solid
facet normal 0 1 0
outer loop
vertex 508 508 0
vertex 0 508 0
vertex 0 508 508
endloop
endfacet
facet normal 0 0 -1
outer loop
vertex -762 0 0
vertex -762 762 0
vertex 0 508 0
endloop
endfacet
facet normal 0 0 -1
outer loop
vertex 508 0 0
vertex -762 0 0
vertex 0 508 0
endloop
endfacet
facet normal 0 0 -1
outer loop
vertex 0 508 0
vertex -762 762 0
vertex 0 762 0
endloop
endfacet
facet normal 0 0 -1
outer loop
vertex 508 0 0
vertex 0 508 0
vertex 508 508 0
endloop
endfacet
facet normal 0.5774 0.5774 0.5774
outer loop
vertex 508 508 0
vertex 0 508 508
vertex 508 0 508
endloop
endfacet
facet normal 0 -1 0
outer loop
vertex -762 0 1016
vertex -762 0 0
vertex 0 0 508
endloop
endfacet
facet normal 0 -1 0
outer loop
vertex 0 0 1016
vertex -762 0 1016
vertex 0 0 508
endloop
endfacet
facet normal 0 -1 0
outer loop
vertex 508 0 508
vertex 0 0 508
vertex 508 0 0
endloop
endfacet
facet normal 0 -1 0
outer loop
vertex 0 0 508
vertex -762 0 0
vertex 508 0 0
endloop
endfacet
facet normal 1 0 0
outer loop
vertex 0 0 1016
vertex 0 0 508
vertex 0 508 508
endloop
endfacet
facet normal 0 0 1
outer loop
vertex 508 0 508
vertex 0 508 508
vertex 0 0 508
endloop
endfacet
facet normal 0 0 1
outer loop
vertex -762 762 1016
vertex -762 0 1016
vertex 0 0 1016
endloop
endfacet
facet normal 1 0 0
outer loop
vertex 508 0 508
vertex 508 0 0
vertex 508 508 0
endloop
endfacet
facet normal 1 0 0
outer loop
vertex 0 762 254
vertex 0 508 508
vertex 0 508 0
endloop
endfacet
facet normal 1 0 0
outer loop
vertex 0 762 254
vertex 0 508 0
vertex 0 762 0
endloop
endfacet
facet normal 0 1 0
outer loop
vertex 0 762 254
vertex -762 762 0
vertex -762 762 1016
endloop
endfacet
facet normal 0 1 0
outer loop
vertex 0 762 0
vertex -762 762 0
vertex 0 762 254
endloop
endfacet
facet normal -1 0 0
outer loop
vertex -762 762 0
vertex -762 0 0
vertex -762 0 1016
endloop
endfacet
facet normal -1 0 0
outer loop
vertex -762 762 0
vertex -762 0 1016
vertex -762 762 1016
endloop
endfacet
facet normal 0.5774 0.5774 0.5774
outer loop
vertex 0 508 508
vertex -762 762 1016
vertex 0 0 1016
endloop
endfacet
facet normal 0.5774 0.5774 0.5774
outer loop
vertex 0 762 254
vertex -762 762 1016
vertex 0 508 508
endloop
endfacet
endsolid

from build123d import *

# Parameters (mm, degrees)
SKETCH1_W           = 762
SKETCH1_H           = 762
BOSS_EXTRUDE2_DEPTH = 1016
SKETCH1_4_W         = 508
SKETCH1_4_H         = 508
BOSS_EXTRUDE3_DEPTH = 508


with BuildPart() as part:
    # Sketch1 → Boss-Extrude2 (new body)
    with BuildSketch(Plane.XY):
        with Locations((-381, 381)):
            Rectangle(SKETCH1_W, SKETCH1_H)
    extrude(amount=BOSS_EXTRUDE2_DEPTH)

    # Sketch1<4> → Boss-Extrude3 (add)
    with BuildSketch(Plane.XY):
        with Locations((254, 254)):
            Rectangle(SKETCH1_4_W, SKETCH1_4_H)
    extrude(amount=BOSS_EXTRUDE3_DEPTH)

    # SurfaceCut1
    split(bisect_by=Plane(origin=(338.666666667, 338.666666667, 338.666666667), x_dir=(0.816496580927726, -0.408248290463863, -0.408248290463863), z_dir=(0.5773502691896258, 0.5773502691896262, 0.5773502691896255)), keep=Keep.BOTTOM)


solid = part.part
